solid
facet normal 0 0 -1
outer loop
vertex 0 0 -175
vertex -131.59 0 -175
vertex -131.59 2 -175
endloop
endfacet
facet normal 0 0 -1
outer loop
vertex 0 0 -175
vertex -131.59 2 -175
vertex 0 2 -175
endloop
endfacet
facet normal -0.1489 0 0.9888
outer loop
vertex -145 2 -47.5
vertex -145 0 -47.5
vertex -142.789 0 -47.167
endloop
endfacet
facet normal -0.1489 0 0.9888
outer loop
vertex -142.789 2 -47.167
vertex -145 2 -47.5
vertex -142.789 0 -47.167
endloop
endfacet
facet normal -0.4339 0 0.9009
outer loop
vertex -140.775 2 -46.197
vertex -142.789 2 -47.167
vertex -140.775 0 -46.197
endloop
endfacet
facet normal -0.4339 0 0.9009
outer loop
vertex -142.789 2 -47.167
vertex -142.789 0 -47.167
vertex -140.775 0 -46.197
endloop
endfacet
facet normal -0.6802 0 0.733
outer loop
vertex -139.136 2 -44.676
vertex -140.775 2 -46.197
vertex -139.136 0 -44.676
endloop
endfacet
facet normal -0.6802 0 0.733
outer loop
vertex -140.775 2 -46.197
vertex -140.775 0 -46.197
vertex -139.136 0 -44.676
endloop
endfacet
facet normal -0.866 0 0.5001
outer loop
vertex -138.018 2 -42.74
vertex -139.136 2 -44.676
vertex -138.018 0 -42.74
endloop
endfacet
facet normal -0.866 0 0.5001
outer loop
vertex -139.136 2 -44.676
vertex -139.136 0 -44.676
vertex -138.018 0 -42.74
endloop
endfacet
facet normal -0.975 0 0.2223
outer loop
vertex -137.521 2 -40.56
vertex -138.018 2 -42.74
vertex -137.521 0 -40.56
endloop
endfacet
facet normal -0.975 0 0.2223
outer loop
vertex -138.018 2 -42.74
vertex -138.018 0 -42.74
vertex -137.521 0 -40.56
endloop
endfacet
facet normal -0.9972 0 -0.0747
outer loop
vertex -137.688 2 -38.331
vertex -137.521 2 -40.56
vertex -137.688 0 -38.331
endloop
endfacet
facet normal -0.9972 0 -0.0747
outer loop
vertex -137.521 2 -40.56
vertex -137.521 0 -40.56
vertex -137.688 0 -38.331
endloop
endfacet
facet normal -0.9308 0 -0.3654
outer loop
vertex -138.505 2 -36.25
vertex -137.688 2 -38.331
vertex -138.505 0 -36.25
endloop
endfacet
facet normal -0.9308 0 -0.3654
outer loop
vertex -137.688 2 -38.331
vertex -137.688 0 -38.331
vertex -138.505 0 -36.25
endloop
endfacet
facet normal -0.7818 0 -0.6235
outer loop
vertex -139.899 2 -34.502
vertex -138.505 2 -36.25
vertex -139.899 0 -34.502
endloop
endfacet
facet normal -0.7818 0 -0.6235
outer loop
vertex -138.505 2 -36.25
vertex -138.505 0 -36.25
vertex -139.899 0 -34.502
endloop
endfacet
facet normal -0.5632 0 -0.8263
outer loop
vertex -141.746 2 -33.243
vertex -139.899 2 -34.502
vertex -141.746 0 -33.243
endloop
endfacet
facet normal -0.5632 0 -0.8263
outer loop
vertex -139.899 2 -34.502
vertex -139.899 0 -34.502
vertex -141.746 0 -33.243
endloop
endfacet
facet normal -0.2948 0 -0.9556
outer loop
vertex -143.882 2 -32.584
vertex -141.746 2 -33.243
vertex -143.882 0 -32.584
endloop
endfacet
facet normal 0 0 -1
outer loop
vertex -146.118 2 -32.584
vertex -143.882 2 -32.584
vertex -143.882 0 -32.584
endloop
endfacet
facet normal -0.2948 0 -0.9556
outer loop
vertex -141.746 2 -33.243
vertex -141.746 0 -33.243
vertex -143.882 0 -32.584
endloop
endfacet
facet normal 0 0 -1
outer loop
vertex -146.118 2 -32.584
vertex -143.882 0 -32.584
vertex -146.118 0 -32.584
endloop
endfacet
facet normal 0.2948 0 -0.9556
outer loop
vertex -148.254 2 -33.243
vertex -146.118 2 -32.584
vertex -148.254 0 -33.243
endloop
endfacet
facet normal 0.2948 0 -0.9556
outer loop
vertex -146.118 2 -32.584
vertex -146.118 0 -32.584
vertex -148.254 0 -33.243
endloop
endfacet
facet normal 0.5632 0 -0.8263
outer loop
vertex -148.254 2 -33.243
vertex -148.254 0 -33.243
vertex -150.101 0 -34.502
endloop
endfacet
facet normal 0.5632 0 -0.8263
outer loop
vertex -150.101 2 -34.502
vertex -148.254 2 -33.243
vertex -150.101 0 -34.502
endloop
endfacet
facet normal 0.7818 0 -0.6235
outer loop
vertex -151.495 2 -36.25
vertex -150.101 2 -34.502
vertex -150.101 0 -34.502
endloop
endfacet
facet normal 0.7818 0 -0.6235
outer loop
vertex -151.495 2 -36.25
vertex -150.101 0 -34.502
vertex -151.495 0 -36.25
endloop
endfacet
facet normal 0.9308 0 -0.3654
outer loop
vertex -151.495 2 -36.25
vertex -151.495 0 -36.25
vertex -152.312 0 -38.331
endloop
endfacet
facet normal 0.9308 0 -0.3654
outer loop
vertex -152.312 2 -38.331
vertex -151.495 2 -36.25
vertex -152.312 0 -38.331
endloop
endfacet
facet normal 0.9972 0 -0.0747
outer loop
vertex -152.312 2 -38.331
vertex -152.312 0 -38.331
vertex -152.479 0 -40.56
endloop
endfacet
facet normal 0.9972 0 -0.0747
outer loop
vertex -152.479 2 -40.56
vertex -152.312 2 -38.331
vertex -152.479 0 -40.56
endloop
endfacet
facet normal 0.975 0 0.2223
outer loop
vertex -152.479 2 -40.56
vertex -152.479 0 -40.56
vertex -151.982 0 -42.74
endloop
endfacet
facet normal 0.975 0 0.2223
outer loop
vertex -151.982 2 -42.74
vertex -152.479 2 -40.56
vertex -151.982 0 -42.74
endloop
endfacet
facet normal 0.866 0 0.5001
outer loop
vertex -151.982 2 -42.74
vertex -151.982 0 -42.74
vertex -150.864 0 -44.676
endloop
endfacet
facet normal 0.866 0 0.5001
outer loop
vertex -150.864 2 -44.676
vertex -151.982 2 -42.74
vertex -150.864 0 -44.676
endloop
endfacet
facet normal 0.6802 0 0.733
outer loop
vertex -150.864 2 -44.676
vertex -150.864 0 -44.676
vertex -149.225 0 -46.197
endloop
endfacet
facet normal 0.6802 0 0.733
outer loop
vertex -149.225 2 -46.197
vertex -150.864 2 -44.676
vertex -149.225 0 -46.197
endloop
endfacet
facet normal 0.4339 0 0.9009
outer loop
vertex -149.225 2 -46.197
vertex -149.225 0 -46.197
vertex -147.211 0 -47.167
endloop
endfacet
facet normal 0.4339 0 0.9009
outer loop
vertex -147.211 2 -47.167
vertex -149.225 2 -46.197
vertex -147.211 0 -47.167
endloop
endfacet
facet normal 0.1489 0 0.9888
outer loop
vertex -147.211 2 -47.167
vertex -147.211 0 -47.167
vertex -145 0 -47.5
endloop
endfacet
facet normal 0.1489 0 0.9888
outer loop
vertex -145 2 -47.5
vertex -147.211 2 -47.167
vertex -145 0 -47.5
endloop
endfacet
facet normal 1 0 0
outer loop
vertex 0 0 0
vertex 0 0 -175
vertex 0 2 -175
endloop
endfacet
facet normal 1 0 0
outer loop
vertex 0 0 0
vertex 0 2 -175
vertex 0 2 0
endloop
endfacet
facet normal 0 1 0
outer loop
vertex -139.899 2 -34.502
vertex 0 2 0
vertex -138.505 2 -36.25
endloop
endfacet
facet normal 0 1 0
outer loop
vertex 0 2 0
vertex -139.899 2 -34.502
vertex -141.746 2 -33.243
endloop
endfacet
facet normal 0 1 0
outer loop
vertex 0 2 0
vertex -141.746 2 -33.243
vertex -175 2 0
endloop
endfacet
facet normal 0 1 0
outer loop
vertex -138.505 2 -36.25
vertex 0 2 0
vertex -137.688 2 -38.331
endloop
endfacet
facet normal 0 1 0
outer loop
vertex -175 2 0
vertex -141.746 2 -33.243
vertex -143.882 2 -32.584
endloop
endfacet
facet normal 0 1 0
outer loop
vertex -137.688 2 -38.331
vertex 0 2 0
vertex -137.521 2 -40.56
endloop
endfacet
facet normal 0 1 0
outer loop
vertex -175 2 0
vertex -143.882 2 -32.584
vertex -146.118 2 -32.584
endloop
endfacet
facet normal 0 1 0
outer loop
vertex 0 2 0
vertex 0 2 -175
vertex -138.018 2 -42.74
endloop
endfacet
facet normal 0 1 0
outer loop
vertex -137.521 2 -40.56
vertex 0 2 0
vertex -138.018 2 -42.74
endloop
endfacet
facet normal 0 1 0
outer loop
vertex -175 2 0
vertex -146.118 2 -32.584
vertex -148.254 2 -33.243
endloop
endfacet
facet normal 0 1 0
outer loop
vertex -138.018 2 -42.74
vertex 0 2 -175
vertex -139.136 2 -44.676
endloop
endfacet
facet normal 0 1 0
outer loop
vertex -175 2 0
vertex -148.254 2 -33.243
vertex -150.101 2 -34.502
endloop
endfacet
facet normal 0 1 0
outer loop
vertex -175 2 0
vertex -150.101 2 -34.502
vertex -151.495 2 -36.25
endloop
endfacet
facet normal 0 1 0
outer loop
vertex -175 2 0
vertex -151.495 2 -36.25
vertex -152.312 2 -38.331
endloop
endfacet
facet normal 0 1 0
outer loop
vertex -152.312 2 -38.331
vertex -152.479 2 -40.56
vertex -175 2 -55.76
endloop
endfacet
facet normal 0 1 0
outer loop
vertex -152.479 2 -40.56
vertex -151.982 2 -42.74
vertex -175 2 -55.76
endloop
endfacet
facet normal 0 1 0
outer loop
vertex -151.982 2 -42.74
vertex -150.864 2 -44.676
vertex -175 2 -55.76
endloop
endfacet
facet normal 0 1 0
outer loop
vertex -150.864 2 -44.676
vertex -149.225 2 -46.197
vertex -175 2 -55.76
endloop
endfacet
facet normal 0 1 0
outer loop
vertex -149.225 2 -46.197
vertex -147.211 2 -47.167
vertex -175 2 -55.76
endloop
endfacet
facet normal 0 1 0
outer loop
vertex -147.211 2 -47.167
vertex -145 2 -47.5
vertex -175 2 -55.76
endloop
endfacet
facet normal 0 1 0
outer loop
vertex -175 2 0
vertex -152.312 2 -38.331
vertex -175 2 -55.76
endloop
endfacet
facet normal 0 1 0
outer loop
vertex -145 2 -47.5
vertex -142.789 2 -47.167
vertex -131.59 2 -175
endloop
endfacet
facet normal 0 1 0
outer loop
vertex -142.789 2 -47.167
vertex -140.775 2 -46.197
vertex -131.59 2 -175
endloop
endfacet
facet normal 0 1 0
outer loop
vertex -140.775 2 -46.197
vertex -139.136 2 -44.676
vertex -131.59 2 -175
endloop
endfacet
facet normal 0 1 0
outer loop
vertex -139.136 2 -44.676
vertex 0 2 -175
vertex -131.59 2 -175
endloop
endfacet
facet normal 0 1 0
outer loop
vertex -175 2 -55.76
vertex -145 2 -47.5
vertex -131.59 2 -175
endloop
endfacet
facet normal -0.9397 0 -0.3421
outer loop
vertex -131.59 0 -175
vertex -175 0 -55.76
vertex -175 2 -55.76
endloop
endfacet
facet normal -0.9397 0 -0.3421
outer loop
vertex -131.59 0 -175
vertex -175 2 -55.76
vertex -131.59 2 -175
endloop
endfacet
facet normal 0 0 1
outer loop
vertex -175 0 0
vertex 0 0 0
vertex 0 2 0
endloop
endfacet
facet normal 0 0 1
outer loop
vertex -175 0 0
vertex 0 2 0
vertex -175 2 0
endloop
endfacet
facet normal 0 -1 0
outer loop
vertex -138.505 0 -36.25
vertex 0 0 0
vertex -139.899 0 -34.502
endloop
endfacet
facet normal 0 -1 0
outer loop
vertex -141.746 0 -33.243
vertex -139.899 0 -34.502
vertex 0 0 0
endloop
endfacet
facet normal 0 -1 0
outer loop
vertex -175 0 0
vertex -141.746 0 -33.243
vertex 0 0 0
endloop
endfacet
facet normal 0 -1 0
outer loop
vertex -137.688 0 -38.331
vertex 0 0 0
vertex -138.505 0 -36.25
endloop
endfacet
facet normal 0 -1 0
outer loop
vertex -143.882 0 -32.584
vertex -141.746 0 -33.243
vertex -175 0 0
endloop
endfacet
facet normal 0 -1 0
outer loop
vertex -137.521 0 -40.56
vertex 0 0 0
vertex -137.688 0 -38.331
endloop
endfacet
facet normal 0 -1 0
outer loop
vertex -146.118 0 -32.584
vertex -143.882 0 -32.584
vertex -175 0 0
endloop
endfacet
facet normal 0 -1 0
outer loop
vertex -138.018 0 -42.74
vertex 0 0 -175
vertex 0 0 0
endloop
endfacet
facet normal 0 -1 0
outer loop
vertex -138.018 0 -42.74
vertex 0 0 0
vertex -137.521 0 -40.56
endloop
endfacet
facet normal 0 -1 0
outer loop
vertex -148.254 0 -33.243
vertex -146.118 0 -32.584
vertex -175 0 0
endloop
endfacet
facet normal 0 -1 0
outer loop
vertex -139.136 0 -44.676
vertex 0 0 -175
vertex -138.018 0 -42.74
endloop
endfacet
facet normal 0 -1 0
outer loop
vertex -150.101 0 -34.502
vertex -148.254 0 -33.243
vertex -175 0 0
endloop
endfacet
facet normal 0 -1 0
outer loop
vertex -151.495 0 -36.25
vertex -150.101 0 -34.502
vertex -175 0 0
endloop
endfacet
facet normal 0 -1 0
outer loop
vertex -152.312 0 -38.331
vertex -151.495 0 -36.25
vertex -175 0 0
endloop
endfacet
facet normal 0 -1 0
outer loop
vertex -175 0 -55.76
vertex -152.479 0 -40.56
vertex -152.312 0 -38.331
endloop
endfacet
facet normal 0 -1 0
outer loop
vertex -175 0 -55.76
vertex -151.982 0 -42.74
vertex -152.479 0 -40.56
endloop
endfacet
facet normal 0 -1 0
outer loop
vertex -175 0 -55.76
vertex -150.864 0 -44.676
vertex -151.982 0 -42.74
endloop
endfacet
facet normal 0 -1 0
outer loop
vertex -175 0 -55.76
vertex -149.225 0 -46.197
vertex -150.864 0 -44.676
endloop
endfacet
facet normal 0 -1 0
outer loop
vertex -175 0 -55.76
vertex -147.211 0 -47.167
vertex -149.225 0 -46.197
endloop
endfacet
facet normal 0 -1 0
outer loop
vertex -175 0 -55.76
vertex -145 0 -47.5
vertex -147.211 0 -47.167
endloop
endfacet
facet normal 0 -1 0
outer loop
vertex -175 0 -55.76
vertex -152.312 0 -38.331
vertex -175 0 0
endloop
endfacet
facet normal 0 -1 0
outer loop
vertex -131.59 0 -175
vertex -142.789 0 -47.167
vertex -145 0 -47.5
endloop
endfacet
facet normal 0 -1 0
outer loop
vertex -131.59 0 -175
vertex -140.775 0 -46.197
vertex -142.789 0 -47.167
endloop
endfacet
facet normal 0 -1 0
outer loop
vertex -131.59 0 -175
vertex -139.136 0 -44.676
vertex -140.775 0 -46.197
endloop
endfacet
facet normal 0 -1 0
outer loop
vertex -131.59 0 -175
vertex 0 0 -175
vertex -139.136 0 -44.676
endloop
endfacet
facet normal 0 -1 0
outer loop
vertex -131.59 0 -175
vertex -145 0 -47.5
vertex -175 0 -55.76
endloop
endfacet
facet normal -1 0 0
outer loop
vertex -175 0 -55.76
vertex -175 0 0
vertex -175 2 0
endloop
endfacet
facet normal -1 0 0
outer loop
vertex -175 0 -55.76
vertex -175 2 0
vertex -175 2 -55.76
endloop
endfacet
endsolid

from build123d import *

# Parameters (mm, degrees)
BOSS_EXTRUDE1_DEPTH = 2
SKETCH2_R           = 7.5
CUT_EXTRUDE1_DEPTH  = 10


with BuildPart() as part:
    # Sketch1 → Boss-Extrude1 (new body)
    with BuildSketch(Plane(origin=(0, 0, 0), x_dir=(1, 0, 0), z_dir=(0, 1, 0))):
        Polygon((-175, 55.76), (-131.59, 175), (0, 175), (0, 0), (-175, 0), align=None)
    extrude(amount=BOSS_EXTRUDE1_DEPTH)

    # Sketch2 → Cut-Extrude1 (cut)
    with BuildSketch(Plane.XZ):
        with Locations(Location((-145, -40, 0), (0, 0, 270))):
            Circle(SKETCH2_R)
    extrude(amount=-CUT_EXTRUDE1_DEPTH, mode=Mode.SUBTRACT)


solid = part.part
